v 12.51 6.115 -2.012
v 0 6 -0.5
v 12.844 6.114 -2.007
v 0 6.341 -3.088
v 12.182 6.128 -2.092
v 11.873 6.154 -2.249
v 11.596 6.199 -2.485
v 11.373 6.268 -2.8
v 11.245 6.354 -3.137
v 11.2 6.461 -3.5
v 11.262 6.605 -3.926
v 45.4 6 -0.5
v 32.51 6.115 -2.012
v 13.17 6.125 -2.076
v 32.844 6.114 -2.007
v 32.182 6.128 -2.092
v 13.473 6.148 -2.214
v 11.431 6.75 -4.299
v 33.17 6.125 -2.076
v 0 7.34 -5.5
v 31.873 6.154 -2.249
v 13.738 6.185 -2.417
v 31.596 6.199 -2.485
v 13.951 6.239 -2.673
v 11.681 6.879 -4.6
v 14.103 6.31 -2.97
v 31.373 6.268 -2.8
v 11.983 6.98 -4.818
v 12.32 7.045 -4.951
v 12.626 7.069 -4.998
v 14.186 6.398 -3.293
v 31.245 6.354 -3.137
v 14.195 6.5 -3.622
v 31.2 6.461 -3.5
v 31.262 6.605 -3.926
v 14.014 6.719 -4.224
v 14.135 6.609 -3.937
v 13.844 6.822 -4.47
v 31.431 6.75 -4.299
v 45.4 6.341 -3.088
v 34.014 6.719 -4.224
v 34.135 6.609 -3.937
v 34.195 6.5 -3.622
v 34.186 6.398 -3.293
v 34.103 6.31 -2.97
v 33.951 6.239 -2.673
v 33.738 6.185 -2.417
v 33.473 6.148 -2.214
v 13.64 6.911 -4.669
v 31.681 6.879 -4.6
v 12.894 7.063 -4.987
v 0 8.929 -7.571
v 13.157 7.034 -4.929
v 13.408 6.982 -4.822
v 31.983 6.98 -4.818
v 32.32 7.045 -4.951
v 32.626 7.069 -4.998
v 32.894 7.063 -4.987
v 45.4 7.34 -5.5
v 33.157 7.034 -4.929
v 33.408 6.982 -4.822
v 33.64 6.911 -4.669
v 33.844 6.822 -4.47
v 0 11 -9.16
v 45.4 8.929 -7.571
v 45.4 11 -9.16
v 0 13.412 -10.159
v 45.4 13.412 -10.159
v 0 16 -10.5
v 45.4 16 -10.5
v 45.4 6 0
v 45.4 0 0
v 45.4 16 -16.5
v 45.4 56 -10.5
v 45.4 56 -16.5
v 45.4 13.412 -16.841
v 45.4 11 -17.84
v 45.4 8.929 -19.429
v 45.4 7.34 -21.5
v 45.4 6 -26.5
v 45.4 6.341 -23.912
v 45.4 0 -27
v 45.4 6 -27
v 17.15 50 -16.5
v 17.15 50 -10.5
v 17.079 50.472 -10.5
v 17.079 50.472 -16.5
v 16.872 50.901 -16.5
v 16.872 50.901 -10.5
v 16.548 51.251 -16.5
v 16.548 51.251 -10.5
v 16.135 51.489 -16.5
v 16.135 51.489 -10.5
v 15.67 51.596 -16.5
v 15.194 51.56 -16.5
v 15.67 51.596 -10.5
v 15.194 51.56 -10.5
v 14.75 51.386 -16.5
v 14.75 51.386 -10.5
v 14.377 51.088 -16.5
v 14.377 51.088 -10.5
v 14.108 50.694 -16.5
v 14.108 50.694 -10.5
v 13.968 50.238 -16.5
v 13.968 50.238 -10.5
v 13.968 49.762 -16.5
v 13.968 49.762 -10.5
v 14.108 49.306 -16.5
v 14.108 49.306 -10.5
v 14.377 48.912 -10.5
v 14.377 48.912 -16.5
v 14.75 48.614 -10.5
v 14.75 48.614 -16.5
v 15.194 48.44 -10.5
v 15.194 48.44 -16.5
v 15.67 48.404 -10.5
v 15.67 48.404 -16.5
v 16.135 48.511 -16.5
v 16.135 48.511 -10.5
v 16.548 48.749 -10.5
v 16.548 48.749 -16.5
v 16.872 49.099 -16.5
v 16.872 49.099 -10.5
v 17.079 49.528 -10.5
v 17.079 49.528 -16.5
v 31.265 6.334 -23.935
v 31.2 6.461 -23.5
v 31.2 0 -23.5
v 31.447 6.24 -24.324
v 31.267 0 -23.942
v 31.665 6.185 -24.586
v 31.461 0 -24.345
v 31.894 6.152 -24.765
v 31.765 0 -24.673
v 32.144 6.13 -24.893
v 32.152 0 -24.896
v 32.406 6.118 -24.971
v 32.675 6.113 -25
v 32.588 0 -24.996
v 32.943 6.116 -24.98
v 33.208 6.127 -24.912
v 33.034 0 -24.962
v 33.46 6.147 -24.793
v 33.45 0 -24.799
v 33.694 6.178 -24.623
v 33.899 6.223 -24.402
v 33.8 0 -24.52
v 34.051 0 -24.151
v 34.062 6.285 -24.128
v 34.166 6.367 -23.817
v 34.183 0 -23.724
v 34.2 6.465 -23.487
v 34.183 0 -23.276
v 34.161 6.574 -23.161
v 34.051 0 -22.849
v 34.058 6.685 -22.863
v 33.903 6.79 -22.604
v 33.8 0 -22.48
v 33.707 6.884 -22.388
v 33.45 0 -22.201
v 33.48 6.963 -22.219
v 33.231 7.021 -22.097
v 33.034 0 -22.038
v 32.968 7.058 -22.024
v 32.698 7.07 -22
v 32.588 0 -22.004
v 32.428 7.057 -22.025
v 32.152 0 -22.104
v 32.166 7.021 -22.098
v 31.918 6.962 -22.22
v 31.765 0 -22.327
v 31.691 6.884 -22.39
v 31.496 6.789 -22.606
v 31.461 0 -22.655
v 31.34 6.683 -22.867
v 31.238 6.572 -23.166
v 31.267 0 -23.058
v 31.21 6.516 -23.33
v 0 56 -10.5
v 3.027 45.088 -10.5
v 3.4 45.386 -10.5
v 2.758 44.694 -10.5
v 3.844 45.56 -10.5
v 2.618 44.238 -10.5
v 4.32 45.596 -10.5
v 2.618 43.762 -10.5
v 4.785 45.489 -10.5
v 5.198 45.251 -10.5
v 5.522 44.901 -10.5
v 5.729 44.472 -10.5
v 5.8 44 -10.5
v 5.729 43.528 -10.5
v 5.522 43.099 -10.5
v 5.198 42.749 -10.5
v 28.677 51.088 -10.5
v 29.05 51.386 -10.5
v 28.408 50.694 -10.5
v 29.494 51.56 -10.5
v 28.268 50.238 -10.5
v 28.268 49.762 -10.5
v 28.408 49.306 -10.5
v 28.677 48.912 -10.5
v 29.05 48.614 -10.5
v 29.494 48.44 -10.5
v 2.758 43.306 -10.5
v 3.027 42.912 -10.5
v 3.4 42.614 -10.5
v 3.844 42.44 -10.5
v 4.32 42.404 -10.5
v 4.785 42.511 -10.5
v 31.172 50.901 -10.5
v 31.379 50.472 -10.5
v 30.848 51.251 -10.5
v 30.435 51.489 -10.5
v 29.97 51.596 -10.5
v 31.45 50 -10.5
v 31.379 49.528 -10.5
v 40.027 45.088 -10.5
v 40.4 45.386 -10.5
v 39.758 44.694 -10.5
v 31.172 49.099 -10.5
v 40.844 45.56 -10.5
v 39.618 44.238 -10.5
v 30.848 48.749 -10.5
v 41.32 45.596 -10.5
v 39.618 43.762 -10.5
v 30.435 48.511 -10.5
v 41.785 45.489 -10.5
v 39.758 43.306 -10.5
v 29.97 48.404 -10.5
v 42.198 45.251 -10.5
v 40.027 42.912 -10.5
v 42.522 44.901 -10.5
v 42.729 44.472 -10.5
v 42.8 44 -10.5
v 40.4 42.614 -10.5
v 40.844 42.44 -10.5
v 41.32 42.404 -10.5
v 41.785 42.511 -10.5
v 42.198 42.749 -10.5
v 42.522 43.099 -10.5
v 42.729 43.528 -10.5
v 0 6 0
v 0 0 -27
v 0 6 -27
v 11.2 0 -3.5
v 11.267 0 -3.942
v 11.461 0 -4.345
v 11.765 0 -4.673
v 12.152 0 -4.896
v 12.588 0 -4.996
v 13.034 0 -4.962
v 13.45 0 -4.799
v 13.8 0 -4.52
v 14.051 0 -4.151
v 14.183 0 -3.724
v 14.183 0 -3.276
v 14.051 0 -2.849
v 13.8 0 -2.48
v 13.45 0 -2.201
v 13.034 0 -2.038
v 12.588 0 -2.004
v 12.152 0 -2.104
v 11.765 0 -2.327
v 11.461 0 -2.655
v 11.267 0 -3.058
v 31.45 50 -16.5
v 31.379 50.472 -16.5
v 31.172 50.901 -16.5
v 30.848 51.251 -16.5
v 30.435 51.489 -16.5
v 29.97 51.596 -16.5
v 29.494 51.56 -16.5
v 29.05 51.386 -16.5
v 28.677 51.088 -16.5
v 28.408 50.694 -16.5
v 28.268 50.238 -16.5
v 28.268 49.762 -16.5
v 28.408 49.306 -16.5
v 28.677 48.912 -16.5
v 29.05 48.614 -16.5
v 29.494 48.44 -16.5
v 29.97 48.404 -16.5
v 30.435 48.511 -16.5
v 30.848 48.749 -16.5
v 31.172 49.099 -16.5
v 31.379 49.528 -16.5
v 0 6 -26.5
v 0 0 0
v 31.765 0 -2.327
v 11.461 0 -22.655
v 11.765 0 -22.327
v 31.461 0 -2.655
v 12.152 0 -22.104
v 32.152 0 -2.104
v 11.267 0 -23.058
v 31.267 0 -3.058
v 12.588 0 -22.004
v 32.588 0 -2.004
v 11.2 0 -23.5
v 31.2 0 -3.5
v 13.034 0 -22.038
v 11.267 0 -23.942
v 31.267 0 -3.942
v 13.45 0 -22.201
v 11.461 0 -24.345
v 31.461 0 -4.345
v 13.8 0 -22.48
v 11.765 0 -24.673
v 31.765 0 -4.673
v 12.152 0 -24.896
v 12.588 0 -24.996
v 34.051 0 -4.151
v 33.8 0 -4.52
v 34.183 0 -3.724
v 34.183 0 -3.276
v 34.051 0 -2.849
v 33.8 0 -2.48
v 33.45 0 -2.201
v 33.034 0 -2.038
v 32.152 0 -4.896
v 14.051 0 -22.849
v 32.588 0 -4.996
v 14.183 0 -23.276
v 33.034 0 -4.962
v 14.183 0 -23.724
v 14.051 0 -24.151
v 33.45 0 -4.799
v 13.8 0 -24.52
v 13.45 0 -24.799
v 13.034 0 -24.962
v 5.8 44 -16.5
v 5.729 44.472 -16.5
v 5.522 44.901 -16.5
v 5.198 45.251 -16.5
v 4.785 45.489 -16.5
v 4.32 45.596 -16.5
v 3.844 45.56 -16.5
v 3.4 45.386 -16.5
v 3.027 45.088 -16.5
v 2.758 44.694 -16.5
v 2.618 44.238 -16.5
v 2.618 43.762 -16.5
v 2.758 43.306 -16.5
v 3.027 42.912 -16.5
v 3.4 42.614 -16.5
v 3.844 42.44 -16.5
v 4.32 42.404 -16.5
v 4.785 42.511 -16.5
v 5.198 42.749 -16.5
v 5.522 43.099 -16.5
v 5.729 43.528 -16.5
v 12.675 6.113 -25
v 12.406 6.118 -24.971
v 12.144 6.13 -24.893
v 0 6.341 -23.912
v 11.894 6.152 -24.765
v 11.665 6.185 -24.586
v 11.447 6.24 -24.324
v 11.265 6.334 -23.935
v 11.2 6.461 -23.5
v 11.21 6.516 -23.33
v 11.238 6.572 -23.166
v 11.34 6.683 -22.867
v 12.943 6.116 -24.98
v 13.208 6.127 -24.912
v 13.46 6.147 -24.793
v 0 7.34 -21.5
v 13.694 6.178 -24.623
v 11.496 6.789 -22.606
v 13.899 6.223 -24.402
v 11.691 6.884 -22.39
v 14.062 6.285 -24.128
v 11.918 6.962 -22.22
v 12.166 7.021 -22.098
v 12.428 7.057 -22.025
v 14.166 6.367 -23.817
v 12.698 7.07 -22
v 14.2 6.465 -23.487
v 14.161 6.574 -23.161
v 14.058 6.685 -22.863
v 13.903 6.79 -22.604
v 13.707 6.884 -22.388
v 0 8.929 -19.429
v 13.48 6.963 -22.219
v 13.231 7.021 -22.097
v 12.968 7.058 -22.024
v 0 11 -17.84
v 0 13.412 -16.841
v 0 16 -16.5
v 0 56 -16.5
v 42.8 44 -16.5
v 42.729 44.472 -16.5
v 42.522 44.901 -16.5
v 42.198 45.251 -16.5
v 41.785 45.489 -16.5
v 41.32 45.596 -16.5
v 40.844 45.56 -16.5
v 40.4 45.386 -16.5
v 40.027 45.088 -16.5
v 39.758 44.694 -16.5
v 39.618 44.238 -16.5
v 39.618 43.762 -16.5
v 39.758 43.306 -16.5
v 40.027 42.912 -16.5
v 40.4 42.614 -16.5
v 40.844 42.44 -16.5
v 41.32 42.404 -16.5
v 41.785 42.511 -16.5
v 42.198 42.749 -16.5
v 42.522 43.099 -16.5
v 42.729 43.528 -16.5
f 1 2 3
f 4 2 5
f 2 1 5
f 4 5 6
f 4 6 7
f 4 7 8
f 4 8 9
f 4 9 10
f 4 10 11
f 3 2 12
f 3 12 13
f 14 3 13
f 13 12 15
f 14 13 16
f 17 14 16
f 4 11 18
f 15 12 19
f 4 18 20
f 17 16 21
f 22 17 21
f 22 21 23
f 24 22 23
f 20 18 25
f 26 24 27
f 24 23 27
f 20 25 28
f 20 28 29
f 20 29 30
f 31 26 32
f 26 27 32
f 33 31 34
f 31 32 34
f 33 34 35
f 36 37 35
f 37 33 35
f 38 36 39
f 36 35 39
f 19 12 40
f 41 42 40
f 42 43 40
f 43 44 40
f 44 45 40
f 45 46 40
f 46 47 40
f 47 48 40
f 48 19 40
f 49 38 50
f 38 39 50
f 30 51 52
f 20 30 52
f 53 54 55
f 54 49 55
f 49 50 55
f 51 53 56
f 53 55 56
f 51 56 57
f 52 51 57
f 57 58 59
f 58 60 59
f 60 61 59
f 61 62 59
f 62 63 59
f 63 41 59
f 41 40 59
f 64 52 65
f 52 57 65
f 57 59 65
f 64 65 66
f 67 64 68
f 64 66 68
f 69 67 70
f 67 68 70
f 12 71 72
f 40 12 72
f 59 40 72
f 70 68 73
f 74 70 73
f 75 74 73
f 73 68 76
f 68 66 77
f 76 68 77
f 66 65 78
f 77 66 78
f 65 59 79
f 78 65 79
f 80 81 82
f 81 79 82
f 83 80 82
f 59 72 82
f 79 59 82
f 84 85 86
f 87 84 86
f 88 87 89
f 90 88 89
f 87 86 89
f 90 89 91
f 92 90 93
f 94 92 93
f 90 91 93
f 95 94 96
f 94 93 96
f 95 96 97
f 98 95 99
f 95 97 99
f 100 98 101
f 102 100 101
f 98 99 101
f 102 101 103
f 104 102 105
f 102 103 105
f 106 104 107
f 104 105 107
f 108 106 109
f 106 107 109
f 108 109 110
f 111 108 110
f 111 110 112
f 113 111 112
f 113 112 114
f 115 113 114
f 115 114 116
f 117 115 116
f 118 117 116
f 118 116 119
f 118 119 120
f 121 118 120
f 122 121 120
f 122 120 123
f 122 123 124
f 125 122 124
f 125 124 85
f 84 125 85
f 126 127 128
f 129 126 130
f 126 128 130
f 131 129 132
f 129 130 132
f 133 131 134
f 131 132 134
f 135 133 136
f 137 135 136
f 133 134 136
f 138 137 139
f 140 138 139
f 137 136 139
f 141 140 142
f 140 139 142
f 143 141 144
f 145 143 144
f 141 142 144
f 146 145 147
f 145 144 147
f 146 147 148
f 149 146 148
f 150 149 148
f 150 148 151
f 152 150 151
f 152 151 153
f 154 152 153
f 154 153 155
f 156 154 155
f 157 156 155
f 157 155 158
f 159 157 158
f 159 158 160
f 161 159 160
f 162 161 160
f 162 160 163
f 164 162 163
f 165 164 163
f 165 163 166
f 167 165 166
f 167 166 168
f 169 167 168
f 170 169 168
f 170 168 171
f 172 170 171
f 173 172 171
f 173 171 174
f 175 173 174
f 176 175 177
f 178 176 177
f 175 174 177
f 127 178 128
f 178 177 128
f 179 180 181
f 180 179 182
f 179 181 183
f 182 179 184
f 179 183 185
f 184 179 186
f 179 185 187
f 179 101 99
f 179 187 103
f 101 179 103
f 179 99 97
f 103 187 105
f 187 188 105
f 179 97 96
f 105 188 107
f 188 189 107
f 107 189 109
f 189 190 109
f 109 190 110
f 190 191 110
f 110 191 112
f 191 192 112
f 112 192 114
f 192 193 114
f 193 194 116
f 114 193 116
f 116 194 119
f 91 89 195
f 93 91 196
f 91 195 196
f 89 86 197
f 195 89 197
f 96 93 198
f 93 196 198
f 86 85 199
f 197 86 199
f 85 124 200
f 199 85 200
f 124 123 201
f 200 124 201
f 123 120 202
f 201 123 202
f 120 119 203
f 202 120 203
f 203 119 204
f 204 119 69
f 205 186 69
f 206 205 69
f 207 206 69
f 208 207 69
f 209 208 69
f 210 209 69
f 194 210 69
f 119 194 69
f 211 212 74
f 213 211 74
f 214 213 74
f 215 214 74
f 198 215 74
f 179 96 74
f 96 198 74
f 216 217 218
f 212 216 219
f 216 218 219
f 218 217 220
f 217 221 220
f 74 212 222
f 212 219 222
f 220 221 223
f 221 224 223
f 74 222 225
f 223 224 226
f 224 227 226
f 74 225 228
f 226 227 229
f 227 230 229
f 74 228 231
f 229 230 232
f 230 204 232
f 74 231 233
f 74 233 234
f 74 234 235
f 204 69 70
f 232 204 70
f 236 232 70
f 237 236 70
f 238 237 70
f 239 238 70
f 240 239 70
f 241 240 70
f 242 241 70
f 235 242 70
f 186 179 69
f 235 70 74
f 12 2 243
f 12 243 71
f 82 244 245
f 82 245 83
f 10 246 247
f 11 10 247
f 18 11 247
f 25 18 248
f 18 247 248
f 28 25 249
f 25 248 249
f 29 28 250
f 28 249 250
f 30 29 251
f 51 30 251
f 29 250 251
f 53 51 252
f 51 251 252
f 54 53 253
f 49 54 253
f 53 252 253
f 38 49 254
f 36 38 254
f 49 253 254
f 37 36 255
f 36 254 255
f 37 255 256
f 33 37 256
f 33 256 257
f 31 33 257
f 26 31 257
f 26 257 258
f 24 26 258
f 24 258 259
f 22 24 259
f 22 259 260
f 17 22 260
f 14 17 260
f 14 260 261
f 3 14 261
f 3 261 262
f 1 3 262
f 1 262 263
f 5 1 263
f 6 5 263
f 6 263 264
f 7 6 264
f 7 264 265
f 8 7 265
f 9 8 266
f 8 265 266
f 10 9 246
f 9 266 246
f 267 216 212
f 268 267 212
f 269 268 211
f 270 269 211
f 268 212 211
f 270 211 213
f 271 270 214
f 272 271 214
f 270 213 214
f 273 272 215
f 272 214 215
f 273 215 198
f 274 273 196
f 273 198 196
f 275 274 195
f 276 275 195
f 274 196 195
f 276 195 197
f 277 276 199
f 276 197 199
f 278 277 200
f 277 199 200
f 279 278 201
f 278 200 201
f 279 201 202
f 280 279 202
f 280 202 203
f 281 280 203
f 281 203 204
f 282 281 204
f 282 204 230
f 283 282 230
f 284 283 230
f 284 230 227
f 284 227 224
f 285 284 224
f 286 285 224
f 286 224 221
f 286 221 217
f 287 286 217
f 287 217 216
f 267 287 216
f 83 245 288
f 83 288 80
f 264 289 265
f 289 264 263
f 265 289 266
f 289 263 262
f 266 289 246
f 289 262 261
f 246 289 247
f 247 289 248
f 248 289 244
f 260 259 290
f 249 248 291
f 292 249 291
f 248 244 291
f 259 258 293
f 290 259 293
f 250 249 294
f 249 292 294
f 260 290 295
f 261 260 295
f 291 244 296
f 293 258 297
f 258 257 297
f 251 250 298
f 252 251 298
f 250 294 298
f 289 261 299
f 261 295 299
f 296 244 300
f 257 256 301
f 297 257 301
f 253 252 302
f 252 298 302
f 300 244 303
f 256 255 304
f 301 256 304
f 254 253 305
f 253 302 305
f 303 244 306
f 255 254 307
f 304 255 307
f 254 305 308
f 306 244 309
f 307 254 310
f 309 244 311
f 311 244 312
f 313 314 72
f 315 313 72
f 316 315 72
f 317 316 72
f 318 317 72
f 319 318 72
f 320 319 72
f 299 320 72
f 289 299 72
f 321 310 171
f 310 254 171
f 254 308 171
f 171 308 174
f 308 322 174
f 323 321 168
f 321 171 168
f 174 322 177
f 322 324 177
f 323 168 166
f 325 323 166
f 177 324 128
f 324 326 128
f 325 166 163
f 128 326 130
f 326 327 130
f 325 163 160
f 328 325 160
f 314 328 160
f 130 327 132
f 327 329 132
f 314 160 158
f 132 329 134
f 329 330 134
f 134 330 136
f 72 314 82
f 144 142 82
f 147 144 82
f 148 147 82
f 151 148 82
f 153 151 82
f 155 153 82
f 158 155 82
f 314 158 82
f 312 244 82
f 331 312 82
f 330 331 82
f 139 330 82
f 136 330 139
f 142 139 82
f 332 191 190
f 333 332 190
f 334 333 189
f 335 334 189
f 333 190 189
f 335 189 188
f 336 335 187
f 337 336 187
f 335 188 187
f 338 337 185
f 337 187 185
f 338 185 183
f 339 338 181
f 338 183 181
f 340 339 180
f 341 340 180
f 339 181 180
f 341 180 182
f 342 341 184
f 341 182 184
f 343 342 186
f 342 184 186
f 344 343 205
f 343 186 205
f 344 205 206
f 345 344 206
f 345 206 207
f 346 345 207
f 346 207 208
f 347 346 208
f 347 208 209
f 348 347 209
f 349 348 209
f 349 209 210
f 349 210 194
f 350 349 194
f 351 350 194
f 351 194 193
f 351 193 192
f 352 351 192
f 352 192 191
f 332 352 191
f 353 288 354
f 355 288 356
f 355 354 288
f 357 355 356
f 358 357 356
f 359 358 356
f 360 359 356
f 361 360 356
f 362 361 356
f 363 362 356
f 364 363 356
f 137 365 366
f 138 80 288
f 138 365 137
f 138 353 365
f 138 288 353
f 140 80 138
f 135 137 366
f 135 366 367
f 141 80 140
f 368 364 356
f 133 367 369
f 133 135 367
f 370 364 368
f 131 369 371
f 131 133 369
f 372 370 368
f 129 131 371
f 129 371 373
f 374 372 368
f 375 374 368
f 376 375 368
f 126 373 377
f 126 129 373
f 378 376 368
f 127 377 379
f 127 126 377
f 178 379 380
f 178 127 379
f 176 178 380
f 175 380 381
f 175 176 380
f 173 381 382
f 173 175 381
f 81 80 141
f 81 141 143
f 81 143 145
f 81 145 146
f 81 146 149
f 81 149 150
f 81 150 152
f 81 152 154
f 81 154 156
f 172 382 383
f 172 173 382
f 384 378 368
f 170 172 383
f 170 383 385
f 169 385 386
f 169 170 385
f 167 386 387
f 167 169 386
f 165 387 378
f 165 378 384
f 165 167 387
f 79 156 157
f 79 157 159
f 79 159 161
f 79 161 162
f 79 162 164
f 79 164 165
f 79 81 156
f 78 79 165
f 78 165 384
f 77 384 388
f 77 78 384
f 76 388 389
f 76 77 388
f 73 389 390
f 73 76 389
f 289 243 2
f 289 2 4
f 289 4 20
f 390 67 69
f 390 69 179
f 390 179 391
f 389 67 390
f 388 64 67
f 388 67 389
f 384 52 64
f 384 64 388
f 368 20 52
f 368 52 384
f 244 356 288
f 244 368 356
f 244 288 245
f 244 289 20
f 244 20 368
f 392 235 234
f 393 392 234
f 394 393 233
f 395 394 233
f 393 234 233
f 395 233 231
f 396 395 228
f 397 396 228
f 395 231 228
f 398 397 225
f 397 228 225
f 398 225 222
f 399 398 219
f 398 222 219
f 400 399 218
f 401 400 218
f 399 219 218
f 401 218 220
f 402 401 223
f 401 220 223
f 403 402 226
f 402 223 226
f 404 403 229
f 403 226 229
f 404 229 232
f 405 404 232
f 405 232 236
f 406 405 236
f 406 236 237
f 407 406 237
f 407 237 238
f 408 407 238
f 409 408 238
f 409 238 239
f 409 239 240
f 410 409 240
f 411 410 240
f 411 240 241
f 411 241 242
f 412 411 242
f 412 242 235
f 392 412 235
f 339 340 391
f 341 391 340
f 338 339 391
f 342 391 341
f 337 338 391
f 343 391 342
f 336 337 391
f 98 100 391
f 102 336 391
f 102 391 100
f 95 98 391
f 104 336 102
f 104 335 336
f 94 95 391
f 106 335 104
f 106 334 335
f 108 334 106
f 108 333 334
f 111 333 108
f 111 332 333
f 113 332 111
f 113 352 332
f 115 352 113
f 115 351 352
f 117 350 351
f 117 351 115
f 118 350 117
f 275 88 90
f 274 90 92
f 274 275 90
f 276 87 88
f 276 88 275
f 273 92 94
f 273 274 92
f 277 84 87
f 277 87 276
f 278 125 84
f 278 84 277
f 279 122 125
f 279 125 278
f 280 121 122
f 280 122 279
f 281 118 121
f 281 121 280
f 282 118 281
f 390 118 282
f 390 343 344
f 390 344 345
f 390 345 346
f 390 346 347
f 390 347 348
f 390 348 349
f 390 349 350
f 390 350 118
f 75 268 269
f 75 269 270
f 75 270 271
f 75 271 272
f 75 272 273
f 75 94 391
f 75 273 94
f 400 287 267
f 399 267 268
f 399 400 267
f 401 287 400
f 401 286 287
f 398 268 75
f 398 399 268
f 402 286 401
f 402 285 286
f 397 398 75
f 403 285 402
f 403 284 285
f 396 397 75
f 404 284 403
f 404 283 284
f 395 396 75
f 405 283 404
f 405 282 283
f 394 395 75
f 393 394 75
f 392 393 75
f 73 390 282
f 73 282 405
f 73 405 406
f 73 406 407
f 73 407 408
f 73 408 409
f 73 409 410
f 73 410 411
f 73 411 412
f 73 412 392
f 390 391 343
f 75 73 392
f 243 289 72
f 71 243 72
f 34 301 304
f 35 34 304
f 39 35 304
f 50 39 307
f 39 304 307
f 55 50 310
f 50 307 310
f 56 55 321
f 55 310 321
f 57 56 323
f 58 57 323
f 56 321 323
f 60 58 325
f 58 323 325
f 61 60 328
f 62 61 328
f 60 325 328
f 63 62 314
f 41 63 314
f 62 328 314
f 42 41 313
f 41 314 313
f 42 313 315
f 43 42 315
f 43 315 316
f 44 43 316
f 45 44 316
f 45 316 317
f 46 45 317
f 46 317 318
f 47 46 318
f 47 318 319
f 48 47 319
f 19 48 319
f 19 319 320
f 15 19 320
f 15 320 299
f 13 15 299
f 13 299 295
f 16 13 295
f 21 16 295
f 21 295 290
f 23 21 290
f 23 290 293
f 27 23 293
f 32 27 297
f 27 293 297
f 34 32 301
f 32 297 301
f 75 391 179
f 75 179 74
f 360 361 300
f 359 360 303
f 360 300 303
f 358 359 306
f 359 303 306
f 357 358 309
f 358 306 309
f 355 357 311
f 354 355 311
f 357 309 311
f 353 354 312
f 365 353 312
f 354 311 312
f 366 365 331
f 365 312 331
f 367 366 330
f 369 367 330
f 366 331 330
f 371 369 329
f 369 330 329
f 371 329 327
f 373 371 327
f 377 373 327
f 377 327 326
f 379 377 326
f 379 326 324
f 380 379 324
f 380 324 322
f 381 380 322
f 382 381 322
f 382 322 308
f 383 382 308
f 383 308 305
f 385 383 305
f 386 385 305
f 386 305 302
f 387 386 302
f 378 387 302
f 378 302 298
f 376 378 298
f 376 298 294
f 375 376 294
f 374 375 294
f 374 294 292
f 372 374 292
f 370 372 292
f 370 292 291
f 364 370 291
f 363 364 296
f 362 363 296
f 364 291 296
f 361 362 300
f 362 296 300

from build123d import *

# Parameters (mm, degrees)
SKETCH1_W             = 45.4
SKETCH1_H             = 27
BOSS_EXTRUDE1_DEPTH   = 6
SKETCH4_W             = 45.4
SKETCH4_H             = 6
BOSS_EXTRUDE2_DEPTH   = 50
FILLET3_R             = 10
F_3_0MM_DOWEL_HOLE1_D = 3
F_3_0MM_DOWEL_HOLE2_D = 3.2
F_3_0MM_DOWEL_HOLE3_D = 3.2


with BuildPart() as part:
    # Sketch1 → Boss-Extrude1 (new body)
    with BuildSketch(Plane(origin=(0, 0, 0), x_dir=(1, 0, 0), z_dir=(0, 1, 0))):
        with Locations((22.7, 13.5)):
            Rectangle(SKETCH1_W, SKETCH1_H)
    extrude(amount=BOSS_EXTRUDE1_DEPTH)

    # Sketch4 → Boss-Extrude2 (add)
    with BuildSketch(Plane(origin=(0, 6, 0), x_dir=(1, 0, 0), z_dir=(0, 1, 0))):
        with Locations((22.7, 13.5)):
            Rectangle(SKETCH4_W, SKETCH4_H)
    extrude(amount=BOSS_EXTRUDE2_DEPTH)

    # Fillet3
    fillet3_edges = [part.edges().sort_by_distance(p)[0] for p in [
        (22.7, 6, -10.5),
        (22.7, 6, -16.5),
    ]]
    fillet(fillet3_edges, radius=FILLET3_R)

    # Ø3.0mm Dowel Hole1 (through all)
    with Locations(Plane(origin=(0, 16, 0), x_dir=(1, 0, 0), z_dir=(0, 1, 0))):
        with Locations((12.7, 23.5), (32.7, 23.5), (32.7, 3.5), (12.7, 3.5)):
            Hole(F_3_0MM_DOWEL_HOLE1_D / 2)

    # Ø3.0mm Dowel Hole2 (through all)
    with Locations(Plane(origin=(0, 0, -16.5), x_dir=(-1, 0, 0), z_dir=(0, 0, -1))):
        with Locations((-29.85, 50), (-15.55, 50)):
            Hole(F_3_0MM_DOWEL_HOLE2_D / 2)

    # Ø3.0mm Dowel Hole3 (through all)
    with Locations(Plane(origin=(4.2, 44, -16.5), x_dir=(-1, 0, 0), z_dir=(0, 0, -1))):
        with Locations((0, 0), (-37, 0)):
            Hole(F_3_0MM_DOWEL_HOLE3_D / 2)


solid = part.part
